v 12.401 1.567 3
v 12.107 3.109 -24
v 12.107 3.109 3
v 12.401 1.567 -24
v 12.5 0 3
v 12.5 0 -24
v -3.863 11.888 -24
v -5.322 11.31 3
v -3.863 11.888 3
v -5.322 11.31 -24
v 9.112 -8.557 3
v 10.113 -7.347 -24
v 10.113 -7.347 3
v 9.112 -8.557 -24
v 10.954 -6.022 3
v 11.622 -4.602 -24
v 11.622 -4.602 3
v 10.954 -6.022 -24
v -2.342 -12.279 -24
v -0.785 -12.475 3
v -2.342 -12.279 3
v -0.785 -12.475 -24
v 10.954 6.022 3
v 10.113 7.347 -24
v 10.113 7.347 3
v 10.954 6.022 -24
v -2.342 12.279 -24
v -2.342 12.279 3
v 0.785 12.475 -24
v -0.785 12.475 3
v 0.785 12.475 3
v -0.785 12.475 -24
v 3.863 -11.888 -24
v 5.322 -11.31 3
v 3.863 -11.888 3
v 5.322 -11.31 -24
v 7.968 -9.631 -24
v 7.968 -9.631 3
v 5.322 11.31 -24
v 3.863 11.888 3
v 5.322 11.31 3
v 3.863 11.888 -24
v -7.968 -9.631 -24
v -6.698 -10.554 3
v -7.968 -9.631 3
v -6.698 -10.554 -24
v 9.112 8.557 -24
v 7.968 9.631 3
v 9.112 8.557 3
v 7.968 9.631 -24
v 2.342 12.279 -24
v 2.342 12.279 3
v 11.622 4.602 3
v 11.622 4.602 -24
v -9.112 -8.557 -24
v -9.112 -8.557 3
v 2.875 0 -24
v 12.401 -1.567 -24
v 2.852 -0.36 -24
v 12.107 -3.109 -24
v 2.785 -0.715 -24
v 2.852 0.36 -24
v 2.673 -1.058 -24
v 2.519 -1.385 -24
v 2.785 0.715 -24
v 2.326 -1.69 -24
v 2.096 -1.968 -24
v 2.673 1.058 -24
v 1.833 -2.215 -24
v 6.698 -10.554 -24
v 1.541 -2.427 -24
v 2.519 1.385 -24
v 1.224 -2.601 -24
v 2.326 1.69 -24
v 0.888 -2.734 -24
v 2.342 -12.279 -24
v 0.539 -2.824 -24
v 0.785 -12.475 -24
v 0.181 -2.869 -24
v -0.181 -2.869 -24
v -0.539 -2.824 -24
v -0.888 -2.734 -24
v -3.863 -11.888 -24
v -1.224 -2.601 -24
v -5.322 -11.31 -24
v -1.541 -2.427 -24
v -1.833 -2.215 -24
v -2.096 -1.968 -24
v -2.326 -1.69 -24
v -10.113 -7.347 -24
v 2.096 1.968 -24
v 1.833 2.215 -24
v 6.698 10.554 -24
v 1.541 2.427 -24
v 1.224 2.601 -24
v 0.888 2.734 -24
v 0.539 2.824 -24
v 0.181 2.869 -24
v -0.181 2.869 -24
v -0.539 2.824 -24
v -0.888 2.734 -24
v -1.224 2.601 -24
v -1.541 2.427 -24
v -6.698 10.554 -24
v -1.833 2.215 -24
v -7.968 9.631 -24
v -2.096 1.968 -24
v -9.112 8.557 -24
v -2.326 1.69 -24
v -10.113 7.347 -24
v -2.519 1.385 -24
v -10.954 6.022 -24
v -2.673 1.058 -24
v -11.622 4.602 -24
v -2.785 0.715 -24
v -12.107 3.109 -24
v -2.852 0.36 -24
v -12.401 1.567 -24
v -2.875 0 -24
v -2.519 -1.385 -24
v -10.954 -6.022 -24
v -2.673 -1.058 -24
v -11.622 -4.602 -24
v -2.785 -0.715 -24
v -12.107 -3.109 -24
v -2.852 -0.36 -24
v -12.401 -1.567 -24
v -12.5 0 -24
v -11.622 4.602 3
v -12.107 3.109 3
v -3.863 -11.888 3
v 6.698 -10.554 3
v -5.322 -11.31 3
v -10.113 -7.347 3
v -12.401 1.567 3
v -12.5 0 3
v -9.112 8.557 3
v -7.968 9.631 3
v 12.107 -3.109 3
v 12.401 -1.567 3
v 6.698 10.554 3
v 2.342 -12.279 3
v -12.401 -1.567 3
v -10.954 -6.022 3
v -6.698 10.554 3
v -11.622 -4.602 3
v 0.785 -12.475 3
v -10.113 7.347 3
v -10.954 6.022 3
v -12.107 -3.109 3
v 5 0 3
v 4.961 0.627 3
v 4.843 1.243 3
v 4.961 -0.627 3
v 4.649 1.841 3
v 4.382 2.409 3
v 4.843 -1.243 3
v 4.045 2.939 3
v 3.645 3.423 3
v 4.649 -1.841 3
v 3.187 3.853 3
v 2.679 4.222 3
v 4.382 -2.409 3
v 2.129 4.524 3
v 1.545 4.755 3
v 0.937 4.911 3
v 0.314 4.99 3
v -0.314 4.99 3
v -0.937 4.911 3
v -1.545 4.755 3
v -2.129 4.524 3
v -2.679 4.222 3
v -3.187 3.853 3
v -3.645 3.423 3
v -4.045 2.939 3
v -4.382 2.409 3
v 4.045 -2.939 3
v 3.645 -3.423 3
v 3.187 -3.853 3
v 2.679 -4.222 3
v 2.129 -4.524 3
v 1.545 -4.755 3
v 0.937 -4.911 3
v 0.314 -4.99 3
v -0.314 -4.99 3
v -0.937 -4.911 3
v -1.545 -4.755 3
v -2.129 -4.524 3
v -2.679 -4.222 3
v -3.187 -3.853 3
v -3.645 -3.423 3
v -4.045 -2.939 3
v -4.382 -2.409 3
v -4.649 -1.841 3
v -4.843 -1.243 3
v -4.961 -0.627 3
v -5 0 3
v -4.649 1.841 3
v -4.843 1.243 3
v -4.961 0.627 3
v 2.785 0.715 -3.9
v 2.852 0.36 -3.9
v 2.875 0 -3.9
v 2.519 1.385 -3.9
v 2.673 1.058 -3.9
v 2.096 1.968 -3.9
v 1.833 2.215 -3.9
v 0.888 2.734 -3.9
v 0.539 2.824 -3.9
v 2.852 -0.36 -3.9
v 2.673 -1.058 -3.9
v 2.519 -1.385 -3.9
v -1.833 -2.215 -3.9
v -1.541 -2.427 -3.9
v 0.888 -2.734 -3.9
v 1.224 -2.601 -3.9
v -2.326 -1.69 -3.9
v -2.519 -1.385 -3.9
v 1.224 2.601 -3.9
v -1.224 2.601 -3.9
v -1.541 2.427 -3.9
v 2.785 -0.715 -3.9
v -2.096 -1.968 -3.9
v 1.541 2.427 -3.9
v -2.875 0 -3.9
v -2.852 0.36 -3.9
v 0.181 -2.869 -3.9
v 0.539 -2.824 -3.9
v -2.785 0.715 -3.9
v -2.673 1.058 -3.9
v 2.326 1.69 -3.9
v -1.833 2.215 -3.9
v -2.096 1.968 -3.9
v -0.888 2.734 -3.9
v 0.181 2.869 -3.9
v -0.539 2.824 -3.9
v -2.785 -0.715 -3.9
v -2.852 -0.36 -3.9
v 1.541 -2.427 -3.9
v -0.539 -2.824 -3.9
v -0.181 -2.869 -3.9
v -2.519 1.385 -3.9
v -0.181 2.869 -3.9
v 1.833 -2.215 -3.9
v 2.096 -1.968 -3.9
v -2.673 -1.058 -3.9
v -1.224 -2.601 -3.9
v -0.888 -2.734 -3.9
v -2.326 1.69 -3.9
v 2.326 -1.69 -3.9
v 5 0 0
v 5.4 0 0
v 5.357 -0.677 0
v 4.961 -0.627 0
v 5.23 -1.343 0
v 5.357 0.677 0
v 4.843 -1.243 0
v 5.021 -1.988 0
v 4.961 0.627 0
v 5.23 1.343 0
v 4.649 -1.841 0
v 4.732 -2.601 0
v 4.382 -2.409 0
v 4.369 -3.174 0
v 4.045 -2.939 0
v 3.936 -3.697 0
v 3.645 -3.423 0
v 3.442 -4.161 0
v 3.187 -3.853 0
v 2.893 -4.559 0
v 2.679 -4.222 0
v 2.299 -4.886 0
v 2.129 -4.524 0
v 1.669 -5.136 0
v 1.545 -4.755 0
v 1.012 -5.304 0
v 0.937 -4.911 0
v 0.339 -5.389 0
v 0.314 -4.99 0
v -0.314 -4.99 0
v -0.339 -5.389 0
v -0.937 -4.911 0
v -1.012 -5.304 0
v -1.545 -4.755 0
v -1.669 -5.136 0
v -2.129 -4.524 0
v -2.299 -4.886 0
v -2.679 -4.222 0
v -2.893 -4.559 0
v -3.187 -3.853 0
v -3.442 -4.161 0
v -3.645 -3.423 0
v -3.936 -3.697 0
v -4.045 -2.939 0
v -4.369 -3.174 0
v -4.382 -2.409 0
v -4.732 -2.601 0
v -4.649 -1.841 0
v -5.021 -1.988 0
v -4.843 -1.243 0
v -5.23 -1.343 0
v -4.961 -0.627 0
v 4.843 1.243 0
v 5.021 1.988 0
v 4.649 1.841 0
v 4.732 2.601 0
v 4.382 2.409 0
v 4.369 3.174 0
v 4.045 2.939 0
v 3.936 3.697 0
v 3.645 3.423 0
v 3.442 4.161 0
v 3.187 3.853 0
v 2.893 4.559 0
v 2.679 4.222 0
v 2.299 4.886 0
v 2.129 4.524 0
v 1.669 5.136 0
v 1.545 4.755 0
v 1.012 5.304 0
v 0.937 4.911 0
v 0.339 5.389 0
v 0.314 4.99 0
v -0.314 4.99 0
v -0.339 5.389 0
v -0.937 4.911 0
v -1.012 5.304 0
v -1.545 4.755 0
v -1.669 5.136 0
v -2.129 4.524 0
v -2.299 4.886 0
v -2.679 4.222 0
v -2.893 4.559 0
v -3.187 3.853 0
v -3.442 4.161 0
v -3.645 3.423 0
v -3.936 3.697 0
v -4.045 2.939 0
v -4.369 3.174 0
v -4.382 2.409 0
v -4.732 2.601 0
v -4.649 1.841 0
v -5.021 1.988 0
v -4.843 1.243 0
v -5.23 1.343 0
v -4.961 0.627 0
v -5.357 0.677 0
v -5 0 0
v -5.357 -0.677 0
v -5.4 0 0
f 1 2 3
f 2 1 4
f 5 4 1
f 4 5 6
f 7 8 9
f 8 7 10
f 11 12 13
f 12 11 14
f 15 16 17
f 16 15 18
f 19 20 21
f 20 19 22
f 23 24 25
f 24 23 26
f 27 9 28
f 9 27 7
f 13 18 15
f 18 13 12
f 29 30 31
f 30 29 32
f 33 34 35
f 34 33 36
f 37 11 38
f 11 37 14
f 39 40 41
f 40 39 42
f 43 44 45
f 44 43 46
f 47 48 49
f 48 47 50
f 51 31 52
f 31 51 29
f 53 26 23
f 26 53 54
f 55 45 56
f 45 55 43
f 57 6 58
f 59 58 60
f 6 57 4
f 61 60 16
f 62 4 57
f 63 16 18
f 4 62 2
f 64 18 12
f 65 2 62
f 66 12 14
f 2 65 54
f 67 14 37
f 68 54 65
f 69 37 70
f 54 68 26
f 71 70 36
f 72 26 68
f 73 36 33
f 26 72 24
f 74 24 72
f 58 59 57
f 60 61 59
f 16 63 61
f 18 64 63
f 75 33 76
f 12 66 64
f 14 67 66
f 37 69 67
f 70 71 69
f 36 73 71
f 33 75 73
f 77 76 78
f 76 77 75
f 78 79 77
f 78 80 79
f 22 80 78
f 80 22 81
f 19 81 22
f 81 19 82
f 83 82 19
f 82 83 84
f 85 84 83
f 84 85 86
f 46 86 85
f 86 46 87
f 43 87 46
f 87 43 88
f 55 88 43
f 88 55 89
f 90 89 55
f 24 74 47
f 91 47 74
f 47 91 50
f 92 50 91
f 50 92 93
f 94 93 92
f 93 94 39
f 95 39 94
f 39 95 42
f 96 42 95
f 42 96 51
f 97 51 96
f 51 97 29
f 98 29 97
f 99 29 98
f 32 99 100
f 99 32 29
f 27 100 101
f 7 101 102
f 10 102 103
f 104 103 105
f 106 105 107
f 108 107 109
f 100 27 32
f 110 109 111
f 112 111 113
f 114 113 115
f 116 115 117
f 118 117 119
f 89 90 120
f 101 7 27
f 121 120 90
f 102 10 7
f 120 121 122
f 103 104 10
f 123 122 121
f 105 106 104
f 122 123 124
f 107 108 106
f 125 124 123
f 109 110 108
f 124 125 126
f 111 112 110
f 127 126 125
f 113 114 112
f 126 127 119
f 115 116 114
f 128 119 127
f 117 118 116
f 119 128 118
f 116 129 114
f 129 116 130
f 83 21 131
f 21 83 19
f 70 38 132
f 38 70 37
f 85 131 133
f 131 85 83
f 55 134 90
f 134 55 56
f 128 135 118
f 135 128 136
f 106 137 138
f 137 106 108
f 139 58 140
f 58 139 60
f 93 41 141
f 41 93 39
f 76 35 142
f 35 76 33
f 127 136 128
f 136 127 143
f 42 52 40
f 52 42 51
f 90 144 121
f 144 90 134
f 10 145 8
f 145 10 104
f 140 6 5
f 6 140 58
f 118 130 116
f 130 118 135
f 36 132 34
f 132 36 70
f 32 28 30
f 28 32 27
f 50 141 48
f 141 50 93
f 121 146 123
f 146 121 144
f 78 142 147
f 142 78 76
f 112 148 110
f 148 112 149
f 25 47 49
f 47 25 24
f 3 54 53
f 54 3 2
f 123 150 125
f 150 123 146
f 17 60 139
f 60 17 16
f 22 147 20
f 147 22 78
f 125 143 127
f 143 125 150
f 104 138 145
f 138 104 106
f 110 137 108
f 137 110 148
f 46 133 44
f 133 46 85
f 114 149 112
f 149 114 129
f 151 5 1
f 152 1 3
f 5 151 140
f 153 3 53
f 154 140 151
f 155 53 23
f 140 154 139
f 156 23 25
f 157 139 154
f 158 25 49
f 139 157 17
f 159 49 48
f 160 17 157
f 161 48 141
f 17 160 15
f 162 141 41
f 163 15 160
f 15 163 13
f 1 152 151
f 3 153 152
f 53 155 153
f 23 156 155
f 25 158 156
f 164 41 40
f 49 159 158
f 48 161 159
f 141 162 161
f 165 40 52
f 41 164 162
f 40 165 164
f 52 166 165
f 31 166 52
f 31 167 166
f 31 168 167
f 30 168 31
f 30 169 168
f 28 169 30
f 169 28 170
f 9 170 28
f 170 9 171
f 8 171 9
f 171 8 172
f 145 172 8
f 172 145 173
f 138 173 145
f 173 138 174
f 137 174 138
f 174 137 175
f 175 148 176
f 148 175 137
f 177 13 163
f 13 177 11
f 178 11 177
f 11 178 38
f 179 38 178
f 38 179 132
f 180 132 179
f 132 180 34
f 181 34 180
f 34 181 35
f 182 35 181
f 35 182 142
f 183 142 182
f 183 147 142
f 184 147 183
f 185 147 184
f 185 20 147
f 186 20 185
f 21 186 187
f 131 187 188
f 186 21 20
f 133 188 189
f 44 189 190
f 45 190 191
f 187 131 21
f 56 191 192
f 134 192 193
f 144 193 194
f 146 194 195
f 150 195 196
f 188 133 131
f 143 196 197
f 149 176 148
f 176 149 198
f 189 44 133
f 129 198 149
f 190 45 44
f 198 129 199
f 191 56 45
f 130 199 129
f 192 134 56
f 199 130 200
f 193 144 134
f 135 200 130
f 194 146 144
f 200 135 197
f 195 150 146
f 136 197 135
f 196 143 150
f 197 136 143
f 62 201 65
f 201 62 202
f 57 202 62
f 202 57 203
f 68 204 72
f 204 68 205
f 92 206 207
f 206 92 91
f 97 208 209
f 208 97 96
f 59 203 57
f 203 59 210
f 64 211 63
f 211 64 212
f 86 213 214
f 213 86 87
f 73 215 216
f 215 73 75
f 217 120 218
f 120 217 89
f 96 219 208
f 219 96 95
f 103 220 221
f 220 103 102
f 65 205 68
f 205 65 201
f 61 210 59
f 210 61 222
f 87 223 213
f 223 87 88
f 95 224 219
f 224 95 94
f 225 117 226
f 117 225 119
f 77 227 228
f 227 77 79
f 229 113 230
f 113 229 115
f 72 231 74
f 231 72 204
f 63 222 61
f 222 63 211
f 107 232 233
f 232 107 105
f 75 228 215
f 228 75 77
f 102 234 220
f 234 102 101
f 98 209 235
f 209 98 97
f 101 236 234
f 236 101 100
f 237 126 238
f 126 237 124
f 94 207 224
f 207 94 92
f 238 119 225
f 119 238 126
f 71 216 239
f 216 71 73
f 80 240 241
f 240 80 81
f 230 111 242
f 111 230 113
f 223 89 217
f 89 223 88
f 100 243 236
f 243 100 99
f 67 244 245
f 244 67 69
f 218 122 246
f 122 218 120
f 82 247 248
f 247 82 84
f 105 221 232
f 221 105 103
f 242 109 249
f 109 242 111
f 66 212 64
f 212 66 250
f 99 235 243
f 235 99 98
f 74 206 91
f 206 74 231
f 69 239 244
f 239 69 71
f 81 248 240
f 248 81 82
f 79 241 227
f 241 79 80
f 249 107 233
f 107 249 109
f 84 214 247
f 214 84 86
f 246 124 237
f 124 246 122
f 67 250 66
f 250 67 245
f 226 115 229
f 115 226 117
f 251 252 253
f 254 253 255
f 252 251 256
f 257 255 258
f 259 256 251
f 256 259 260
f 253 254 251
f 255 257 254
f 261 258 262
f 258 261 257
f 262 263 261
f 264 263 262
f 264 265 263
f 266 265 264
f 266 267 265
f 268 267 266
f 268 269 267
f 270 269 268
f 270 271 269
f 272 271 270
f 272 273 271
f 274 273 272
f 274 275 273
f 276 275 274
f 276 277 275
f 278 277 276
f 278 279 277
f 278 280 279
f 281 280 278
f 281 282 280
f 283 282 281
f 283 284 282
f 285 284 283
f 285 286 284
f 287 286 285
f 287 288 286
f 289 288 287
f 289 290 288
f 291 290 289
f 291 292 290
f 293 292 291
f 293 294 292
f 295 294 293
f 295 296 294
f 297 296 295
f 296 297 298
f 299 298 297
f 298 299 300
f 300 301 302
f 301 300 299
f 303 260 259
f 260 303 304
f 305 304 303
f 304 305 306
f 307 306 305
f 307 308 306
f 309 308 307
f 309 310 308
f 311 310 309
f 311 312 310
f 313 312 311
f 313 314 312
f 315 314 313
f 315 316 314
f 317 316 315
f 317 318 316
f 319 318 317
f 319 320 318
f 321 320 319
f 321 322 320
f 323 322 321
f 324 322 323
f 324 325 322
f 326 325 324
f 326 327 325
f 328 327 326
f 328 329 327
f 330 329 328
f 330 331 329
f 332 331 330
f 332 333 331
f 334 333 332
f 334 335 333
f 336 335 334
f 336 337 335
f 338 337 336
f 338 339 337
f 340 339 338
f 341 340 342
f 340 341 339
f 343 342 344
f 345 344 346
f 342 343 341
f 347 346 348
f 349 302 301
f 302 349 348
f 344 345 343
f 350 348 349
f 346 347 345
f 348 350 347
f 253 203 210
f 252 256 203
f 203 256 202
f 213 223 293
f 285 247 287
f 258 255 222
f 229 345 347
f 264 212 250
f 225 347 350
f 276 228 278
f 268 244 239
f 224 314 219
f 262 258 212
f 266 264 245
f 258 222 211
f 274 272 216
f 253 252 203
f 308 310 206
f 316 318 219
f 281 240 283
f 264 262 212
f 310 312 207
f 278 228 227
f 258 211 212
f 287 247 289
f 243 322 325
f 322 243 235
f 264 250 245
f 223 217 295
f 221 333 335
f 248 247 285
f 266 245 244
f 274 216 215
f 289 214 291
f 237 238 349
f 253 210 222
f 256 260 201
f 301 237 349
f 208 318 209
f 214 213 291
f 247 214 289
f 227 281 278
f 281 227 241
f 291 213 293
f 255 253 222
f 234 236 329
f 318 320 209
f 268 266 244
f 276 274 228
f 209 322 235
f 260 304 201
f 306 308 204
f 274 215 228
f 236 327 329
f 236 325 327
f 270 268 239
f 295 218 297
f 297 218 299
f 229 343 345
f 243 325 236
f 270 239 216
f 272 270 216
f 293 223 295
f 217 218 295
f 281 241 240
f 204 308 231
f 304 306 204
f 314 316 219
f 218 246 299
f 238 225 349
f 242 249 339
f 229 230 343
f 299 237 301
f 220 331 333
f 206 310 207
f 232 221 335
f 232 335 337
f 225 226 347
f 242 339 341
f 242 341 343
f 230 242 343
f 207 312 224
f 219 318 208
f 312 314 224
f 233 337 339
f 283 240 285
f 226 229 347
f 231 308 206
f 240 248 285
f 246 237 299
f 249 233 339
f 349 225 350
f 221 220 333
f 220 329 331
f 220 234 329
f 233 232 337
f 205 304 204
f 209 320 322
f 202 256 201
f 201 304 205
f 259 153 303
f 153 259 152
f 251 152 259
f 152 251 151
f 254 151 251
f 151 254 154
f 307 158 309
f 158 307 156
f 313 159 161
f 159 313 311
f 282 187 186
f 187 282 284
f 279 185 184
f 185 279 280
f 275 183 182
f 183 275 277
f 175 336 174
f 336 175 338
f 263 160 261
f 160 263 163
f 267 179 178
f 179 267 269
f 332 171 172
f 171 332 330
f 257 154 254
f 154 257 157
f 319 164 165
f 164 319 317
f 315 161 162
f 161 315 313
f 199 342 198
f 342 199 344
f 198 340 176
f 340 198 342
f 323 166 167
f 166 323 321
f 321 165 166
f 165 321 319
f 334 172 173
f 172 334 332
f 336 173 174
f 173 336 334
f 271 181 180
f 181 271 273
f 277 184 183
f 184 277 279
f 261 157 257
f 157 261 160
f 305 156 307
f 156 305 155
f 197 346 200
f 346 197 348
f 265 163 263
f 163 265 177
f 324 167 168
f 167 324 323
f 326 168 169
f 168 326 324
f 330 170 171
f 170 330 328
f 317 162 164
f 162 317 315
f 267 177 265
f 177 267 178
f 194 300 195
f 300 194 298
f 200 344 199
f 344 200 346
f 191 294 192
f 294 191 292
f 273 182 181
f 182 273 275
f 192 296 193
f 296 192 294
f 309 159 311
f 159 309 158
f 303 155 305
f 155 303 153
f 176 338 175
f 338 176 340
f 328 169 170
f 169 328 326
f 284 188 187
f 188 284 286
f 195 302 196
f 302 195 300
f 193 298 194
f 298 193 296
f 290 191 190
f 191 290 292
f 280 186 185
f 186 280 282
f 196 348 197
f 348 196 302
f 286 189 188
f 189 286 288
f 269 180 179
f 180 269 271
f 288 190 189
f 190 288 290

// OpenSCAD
$fn = 50;

difference() {
	union() {
		translate(v = [0, 0, -24.0]) {
			cylinder(h = 27, r = 12.5);
		}
		#translate(v = [0, 0, -27.0]) {
			cylinder(h = 27, r = 2.875);
		}
	}
	union() {
		translate(v = [0, 0, 0]) {
			rotate(a = [0, 0, 0]) {
				difference() {
					union() {
						translate(v = [0, 0, -27.0]) {
							cylinder(h = 27, r = 2.6);
						}
						translate(v = [0, 0, -3.9]) {
							cylinder(h = 3.9, r1 = 2.875, r2 = 5.4);
						}
						translate(v = [0, 0, -27.0]) {
							cylinder(h = 27, r = 2.875);
						}
						translate(v = [0, 0, -27.0]) {
							cylinder(h = 27, r = 2.6);
						}
					}
					union();
				}
			}
		}
		#cylinder(h = 3, r = 5.0);
	}
}
